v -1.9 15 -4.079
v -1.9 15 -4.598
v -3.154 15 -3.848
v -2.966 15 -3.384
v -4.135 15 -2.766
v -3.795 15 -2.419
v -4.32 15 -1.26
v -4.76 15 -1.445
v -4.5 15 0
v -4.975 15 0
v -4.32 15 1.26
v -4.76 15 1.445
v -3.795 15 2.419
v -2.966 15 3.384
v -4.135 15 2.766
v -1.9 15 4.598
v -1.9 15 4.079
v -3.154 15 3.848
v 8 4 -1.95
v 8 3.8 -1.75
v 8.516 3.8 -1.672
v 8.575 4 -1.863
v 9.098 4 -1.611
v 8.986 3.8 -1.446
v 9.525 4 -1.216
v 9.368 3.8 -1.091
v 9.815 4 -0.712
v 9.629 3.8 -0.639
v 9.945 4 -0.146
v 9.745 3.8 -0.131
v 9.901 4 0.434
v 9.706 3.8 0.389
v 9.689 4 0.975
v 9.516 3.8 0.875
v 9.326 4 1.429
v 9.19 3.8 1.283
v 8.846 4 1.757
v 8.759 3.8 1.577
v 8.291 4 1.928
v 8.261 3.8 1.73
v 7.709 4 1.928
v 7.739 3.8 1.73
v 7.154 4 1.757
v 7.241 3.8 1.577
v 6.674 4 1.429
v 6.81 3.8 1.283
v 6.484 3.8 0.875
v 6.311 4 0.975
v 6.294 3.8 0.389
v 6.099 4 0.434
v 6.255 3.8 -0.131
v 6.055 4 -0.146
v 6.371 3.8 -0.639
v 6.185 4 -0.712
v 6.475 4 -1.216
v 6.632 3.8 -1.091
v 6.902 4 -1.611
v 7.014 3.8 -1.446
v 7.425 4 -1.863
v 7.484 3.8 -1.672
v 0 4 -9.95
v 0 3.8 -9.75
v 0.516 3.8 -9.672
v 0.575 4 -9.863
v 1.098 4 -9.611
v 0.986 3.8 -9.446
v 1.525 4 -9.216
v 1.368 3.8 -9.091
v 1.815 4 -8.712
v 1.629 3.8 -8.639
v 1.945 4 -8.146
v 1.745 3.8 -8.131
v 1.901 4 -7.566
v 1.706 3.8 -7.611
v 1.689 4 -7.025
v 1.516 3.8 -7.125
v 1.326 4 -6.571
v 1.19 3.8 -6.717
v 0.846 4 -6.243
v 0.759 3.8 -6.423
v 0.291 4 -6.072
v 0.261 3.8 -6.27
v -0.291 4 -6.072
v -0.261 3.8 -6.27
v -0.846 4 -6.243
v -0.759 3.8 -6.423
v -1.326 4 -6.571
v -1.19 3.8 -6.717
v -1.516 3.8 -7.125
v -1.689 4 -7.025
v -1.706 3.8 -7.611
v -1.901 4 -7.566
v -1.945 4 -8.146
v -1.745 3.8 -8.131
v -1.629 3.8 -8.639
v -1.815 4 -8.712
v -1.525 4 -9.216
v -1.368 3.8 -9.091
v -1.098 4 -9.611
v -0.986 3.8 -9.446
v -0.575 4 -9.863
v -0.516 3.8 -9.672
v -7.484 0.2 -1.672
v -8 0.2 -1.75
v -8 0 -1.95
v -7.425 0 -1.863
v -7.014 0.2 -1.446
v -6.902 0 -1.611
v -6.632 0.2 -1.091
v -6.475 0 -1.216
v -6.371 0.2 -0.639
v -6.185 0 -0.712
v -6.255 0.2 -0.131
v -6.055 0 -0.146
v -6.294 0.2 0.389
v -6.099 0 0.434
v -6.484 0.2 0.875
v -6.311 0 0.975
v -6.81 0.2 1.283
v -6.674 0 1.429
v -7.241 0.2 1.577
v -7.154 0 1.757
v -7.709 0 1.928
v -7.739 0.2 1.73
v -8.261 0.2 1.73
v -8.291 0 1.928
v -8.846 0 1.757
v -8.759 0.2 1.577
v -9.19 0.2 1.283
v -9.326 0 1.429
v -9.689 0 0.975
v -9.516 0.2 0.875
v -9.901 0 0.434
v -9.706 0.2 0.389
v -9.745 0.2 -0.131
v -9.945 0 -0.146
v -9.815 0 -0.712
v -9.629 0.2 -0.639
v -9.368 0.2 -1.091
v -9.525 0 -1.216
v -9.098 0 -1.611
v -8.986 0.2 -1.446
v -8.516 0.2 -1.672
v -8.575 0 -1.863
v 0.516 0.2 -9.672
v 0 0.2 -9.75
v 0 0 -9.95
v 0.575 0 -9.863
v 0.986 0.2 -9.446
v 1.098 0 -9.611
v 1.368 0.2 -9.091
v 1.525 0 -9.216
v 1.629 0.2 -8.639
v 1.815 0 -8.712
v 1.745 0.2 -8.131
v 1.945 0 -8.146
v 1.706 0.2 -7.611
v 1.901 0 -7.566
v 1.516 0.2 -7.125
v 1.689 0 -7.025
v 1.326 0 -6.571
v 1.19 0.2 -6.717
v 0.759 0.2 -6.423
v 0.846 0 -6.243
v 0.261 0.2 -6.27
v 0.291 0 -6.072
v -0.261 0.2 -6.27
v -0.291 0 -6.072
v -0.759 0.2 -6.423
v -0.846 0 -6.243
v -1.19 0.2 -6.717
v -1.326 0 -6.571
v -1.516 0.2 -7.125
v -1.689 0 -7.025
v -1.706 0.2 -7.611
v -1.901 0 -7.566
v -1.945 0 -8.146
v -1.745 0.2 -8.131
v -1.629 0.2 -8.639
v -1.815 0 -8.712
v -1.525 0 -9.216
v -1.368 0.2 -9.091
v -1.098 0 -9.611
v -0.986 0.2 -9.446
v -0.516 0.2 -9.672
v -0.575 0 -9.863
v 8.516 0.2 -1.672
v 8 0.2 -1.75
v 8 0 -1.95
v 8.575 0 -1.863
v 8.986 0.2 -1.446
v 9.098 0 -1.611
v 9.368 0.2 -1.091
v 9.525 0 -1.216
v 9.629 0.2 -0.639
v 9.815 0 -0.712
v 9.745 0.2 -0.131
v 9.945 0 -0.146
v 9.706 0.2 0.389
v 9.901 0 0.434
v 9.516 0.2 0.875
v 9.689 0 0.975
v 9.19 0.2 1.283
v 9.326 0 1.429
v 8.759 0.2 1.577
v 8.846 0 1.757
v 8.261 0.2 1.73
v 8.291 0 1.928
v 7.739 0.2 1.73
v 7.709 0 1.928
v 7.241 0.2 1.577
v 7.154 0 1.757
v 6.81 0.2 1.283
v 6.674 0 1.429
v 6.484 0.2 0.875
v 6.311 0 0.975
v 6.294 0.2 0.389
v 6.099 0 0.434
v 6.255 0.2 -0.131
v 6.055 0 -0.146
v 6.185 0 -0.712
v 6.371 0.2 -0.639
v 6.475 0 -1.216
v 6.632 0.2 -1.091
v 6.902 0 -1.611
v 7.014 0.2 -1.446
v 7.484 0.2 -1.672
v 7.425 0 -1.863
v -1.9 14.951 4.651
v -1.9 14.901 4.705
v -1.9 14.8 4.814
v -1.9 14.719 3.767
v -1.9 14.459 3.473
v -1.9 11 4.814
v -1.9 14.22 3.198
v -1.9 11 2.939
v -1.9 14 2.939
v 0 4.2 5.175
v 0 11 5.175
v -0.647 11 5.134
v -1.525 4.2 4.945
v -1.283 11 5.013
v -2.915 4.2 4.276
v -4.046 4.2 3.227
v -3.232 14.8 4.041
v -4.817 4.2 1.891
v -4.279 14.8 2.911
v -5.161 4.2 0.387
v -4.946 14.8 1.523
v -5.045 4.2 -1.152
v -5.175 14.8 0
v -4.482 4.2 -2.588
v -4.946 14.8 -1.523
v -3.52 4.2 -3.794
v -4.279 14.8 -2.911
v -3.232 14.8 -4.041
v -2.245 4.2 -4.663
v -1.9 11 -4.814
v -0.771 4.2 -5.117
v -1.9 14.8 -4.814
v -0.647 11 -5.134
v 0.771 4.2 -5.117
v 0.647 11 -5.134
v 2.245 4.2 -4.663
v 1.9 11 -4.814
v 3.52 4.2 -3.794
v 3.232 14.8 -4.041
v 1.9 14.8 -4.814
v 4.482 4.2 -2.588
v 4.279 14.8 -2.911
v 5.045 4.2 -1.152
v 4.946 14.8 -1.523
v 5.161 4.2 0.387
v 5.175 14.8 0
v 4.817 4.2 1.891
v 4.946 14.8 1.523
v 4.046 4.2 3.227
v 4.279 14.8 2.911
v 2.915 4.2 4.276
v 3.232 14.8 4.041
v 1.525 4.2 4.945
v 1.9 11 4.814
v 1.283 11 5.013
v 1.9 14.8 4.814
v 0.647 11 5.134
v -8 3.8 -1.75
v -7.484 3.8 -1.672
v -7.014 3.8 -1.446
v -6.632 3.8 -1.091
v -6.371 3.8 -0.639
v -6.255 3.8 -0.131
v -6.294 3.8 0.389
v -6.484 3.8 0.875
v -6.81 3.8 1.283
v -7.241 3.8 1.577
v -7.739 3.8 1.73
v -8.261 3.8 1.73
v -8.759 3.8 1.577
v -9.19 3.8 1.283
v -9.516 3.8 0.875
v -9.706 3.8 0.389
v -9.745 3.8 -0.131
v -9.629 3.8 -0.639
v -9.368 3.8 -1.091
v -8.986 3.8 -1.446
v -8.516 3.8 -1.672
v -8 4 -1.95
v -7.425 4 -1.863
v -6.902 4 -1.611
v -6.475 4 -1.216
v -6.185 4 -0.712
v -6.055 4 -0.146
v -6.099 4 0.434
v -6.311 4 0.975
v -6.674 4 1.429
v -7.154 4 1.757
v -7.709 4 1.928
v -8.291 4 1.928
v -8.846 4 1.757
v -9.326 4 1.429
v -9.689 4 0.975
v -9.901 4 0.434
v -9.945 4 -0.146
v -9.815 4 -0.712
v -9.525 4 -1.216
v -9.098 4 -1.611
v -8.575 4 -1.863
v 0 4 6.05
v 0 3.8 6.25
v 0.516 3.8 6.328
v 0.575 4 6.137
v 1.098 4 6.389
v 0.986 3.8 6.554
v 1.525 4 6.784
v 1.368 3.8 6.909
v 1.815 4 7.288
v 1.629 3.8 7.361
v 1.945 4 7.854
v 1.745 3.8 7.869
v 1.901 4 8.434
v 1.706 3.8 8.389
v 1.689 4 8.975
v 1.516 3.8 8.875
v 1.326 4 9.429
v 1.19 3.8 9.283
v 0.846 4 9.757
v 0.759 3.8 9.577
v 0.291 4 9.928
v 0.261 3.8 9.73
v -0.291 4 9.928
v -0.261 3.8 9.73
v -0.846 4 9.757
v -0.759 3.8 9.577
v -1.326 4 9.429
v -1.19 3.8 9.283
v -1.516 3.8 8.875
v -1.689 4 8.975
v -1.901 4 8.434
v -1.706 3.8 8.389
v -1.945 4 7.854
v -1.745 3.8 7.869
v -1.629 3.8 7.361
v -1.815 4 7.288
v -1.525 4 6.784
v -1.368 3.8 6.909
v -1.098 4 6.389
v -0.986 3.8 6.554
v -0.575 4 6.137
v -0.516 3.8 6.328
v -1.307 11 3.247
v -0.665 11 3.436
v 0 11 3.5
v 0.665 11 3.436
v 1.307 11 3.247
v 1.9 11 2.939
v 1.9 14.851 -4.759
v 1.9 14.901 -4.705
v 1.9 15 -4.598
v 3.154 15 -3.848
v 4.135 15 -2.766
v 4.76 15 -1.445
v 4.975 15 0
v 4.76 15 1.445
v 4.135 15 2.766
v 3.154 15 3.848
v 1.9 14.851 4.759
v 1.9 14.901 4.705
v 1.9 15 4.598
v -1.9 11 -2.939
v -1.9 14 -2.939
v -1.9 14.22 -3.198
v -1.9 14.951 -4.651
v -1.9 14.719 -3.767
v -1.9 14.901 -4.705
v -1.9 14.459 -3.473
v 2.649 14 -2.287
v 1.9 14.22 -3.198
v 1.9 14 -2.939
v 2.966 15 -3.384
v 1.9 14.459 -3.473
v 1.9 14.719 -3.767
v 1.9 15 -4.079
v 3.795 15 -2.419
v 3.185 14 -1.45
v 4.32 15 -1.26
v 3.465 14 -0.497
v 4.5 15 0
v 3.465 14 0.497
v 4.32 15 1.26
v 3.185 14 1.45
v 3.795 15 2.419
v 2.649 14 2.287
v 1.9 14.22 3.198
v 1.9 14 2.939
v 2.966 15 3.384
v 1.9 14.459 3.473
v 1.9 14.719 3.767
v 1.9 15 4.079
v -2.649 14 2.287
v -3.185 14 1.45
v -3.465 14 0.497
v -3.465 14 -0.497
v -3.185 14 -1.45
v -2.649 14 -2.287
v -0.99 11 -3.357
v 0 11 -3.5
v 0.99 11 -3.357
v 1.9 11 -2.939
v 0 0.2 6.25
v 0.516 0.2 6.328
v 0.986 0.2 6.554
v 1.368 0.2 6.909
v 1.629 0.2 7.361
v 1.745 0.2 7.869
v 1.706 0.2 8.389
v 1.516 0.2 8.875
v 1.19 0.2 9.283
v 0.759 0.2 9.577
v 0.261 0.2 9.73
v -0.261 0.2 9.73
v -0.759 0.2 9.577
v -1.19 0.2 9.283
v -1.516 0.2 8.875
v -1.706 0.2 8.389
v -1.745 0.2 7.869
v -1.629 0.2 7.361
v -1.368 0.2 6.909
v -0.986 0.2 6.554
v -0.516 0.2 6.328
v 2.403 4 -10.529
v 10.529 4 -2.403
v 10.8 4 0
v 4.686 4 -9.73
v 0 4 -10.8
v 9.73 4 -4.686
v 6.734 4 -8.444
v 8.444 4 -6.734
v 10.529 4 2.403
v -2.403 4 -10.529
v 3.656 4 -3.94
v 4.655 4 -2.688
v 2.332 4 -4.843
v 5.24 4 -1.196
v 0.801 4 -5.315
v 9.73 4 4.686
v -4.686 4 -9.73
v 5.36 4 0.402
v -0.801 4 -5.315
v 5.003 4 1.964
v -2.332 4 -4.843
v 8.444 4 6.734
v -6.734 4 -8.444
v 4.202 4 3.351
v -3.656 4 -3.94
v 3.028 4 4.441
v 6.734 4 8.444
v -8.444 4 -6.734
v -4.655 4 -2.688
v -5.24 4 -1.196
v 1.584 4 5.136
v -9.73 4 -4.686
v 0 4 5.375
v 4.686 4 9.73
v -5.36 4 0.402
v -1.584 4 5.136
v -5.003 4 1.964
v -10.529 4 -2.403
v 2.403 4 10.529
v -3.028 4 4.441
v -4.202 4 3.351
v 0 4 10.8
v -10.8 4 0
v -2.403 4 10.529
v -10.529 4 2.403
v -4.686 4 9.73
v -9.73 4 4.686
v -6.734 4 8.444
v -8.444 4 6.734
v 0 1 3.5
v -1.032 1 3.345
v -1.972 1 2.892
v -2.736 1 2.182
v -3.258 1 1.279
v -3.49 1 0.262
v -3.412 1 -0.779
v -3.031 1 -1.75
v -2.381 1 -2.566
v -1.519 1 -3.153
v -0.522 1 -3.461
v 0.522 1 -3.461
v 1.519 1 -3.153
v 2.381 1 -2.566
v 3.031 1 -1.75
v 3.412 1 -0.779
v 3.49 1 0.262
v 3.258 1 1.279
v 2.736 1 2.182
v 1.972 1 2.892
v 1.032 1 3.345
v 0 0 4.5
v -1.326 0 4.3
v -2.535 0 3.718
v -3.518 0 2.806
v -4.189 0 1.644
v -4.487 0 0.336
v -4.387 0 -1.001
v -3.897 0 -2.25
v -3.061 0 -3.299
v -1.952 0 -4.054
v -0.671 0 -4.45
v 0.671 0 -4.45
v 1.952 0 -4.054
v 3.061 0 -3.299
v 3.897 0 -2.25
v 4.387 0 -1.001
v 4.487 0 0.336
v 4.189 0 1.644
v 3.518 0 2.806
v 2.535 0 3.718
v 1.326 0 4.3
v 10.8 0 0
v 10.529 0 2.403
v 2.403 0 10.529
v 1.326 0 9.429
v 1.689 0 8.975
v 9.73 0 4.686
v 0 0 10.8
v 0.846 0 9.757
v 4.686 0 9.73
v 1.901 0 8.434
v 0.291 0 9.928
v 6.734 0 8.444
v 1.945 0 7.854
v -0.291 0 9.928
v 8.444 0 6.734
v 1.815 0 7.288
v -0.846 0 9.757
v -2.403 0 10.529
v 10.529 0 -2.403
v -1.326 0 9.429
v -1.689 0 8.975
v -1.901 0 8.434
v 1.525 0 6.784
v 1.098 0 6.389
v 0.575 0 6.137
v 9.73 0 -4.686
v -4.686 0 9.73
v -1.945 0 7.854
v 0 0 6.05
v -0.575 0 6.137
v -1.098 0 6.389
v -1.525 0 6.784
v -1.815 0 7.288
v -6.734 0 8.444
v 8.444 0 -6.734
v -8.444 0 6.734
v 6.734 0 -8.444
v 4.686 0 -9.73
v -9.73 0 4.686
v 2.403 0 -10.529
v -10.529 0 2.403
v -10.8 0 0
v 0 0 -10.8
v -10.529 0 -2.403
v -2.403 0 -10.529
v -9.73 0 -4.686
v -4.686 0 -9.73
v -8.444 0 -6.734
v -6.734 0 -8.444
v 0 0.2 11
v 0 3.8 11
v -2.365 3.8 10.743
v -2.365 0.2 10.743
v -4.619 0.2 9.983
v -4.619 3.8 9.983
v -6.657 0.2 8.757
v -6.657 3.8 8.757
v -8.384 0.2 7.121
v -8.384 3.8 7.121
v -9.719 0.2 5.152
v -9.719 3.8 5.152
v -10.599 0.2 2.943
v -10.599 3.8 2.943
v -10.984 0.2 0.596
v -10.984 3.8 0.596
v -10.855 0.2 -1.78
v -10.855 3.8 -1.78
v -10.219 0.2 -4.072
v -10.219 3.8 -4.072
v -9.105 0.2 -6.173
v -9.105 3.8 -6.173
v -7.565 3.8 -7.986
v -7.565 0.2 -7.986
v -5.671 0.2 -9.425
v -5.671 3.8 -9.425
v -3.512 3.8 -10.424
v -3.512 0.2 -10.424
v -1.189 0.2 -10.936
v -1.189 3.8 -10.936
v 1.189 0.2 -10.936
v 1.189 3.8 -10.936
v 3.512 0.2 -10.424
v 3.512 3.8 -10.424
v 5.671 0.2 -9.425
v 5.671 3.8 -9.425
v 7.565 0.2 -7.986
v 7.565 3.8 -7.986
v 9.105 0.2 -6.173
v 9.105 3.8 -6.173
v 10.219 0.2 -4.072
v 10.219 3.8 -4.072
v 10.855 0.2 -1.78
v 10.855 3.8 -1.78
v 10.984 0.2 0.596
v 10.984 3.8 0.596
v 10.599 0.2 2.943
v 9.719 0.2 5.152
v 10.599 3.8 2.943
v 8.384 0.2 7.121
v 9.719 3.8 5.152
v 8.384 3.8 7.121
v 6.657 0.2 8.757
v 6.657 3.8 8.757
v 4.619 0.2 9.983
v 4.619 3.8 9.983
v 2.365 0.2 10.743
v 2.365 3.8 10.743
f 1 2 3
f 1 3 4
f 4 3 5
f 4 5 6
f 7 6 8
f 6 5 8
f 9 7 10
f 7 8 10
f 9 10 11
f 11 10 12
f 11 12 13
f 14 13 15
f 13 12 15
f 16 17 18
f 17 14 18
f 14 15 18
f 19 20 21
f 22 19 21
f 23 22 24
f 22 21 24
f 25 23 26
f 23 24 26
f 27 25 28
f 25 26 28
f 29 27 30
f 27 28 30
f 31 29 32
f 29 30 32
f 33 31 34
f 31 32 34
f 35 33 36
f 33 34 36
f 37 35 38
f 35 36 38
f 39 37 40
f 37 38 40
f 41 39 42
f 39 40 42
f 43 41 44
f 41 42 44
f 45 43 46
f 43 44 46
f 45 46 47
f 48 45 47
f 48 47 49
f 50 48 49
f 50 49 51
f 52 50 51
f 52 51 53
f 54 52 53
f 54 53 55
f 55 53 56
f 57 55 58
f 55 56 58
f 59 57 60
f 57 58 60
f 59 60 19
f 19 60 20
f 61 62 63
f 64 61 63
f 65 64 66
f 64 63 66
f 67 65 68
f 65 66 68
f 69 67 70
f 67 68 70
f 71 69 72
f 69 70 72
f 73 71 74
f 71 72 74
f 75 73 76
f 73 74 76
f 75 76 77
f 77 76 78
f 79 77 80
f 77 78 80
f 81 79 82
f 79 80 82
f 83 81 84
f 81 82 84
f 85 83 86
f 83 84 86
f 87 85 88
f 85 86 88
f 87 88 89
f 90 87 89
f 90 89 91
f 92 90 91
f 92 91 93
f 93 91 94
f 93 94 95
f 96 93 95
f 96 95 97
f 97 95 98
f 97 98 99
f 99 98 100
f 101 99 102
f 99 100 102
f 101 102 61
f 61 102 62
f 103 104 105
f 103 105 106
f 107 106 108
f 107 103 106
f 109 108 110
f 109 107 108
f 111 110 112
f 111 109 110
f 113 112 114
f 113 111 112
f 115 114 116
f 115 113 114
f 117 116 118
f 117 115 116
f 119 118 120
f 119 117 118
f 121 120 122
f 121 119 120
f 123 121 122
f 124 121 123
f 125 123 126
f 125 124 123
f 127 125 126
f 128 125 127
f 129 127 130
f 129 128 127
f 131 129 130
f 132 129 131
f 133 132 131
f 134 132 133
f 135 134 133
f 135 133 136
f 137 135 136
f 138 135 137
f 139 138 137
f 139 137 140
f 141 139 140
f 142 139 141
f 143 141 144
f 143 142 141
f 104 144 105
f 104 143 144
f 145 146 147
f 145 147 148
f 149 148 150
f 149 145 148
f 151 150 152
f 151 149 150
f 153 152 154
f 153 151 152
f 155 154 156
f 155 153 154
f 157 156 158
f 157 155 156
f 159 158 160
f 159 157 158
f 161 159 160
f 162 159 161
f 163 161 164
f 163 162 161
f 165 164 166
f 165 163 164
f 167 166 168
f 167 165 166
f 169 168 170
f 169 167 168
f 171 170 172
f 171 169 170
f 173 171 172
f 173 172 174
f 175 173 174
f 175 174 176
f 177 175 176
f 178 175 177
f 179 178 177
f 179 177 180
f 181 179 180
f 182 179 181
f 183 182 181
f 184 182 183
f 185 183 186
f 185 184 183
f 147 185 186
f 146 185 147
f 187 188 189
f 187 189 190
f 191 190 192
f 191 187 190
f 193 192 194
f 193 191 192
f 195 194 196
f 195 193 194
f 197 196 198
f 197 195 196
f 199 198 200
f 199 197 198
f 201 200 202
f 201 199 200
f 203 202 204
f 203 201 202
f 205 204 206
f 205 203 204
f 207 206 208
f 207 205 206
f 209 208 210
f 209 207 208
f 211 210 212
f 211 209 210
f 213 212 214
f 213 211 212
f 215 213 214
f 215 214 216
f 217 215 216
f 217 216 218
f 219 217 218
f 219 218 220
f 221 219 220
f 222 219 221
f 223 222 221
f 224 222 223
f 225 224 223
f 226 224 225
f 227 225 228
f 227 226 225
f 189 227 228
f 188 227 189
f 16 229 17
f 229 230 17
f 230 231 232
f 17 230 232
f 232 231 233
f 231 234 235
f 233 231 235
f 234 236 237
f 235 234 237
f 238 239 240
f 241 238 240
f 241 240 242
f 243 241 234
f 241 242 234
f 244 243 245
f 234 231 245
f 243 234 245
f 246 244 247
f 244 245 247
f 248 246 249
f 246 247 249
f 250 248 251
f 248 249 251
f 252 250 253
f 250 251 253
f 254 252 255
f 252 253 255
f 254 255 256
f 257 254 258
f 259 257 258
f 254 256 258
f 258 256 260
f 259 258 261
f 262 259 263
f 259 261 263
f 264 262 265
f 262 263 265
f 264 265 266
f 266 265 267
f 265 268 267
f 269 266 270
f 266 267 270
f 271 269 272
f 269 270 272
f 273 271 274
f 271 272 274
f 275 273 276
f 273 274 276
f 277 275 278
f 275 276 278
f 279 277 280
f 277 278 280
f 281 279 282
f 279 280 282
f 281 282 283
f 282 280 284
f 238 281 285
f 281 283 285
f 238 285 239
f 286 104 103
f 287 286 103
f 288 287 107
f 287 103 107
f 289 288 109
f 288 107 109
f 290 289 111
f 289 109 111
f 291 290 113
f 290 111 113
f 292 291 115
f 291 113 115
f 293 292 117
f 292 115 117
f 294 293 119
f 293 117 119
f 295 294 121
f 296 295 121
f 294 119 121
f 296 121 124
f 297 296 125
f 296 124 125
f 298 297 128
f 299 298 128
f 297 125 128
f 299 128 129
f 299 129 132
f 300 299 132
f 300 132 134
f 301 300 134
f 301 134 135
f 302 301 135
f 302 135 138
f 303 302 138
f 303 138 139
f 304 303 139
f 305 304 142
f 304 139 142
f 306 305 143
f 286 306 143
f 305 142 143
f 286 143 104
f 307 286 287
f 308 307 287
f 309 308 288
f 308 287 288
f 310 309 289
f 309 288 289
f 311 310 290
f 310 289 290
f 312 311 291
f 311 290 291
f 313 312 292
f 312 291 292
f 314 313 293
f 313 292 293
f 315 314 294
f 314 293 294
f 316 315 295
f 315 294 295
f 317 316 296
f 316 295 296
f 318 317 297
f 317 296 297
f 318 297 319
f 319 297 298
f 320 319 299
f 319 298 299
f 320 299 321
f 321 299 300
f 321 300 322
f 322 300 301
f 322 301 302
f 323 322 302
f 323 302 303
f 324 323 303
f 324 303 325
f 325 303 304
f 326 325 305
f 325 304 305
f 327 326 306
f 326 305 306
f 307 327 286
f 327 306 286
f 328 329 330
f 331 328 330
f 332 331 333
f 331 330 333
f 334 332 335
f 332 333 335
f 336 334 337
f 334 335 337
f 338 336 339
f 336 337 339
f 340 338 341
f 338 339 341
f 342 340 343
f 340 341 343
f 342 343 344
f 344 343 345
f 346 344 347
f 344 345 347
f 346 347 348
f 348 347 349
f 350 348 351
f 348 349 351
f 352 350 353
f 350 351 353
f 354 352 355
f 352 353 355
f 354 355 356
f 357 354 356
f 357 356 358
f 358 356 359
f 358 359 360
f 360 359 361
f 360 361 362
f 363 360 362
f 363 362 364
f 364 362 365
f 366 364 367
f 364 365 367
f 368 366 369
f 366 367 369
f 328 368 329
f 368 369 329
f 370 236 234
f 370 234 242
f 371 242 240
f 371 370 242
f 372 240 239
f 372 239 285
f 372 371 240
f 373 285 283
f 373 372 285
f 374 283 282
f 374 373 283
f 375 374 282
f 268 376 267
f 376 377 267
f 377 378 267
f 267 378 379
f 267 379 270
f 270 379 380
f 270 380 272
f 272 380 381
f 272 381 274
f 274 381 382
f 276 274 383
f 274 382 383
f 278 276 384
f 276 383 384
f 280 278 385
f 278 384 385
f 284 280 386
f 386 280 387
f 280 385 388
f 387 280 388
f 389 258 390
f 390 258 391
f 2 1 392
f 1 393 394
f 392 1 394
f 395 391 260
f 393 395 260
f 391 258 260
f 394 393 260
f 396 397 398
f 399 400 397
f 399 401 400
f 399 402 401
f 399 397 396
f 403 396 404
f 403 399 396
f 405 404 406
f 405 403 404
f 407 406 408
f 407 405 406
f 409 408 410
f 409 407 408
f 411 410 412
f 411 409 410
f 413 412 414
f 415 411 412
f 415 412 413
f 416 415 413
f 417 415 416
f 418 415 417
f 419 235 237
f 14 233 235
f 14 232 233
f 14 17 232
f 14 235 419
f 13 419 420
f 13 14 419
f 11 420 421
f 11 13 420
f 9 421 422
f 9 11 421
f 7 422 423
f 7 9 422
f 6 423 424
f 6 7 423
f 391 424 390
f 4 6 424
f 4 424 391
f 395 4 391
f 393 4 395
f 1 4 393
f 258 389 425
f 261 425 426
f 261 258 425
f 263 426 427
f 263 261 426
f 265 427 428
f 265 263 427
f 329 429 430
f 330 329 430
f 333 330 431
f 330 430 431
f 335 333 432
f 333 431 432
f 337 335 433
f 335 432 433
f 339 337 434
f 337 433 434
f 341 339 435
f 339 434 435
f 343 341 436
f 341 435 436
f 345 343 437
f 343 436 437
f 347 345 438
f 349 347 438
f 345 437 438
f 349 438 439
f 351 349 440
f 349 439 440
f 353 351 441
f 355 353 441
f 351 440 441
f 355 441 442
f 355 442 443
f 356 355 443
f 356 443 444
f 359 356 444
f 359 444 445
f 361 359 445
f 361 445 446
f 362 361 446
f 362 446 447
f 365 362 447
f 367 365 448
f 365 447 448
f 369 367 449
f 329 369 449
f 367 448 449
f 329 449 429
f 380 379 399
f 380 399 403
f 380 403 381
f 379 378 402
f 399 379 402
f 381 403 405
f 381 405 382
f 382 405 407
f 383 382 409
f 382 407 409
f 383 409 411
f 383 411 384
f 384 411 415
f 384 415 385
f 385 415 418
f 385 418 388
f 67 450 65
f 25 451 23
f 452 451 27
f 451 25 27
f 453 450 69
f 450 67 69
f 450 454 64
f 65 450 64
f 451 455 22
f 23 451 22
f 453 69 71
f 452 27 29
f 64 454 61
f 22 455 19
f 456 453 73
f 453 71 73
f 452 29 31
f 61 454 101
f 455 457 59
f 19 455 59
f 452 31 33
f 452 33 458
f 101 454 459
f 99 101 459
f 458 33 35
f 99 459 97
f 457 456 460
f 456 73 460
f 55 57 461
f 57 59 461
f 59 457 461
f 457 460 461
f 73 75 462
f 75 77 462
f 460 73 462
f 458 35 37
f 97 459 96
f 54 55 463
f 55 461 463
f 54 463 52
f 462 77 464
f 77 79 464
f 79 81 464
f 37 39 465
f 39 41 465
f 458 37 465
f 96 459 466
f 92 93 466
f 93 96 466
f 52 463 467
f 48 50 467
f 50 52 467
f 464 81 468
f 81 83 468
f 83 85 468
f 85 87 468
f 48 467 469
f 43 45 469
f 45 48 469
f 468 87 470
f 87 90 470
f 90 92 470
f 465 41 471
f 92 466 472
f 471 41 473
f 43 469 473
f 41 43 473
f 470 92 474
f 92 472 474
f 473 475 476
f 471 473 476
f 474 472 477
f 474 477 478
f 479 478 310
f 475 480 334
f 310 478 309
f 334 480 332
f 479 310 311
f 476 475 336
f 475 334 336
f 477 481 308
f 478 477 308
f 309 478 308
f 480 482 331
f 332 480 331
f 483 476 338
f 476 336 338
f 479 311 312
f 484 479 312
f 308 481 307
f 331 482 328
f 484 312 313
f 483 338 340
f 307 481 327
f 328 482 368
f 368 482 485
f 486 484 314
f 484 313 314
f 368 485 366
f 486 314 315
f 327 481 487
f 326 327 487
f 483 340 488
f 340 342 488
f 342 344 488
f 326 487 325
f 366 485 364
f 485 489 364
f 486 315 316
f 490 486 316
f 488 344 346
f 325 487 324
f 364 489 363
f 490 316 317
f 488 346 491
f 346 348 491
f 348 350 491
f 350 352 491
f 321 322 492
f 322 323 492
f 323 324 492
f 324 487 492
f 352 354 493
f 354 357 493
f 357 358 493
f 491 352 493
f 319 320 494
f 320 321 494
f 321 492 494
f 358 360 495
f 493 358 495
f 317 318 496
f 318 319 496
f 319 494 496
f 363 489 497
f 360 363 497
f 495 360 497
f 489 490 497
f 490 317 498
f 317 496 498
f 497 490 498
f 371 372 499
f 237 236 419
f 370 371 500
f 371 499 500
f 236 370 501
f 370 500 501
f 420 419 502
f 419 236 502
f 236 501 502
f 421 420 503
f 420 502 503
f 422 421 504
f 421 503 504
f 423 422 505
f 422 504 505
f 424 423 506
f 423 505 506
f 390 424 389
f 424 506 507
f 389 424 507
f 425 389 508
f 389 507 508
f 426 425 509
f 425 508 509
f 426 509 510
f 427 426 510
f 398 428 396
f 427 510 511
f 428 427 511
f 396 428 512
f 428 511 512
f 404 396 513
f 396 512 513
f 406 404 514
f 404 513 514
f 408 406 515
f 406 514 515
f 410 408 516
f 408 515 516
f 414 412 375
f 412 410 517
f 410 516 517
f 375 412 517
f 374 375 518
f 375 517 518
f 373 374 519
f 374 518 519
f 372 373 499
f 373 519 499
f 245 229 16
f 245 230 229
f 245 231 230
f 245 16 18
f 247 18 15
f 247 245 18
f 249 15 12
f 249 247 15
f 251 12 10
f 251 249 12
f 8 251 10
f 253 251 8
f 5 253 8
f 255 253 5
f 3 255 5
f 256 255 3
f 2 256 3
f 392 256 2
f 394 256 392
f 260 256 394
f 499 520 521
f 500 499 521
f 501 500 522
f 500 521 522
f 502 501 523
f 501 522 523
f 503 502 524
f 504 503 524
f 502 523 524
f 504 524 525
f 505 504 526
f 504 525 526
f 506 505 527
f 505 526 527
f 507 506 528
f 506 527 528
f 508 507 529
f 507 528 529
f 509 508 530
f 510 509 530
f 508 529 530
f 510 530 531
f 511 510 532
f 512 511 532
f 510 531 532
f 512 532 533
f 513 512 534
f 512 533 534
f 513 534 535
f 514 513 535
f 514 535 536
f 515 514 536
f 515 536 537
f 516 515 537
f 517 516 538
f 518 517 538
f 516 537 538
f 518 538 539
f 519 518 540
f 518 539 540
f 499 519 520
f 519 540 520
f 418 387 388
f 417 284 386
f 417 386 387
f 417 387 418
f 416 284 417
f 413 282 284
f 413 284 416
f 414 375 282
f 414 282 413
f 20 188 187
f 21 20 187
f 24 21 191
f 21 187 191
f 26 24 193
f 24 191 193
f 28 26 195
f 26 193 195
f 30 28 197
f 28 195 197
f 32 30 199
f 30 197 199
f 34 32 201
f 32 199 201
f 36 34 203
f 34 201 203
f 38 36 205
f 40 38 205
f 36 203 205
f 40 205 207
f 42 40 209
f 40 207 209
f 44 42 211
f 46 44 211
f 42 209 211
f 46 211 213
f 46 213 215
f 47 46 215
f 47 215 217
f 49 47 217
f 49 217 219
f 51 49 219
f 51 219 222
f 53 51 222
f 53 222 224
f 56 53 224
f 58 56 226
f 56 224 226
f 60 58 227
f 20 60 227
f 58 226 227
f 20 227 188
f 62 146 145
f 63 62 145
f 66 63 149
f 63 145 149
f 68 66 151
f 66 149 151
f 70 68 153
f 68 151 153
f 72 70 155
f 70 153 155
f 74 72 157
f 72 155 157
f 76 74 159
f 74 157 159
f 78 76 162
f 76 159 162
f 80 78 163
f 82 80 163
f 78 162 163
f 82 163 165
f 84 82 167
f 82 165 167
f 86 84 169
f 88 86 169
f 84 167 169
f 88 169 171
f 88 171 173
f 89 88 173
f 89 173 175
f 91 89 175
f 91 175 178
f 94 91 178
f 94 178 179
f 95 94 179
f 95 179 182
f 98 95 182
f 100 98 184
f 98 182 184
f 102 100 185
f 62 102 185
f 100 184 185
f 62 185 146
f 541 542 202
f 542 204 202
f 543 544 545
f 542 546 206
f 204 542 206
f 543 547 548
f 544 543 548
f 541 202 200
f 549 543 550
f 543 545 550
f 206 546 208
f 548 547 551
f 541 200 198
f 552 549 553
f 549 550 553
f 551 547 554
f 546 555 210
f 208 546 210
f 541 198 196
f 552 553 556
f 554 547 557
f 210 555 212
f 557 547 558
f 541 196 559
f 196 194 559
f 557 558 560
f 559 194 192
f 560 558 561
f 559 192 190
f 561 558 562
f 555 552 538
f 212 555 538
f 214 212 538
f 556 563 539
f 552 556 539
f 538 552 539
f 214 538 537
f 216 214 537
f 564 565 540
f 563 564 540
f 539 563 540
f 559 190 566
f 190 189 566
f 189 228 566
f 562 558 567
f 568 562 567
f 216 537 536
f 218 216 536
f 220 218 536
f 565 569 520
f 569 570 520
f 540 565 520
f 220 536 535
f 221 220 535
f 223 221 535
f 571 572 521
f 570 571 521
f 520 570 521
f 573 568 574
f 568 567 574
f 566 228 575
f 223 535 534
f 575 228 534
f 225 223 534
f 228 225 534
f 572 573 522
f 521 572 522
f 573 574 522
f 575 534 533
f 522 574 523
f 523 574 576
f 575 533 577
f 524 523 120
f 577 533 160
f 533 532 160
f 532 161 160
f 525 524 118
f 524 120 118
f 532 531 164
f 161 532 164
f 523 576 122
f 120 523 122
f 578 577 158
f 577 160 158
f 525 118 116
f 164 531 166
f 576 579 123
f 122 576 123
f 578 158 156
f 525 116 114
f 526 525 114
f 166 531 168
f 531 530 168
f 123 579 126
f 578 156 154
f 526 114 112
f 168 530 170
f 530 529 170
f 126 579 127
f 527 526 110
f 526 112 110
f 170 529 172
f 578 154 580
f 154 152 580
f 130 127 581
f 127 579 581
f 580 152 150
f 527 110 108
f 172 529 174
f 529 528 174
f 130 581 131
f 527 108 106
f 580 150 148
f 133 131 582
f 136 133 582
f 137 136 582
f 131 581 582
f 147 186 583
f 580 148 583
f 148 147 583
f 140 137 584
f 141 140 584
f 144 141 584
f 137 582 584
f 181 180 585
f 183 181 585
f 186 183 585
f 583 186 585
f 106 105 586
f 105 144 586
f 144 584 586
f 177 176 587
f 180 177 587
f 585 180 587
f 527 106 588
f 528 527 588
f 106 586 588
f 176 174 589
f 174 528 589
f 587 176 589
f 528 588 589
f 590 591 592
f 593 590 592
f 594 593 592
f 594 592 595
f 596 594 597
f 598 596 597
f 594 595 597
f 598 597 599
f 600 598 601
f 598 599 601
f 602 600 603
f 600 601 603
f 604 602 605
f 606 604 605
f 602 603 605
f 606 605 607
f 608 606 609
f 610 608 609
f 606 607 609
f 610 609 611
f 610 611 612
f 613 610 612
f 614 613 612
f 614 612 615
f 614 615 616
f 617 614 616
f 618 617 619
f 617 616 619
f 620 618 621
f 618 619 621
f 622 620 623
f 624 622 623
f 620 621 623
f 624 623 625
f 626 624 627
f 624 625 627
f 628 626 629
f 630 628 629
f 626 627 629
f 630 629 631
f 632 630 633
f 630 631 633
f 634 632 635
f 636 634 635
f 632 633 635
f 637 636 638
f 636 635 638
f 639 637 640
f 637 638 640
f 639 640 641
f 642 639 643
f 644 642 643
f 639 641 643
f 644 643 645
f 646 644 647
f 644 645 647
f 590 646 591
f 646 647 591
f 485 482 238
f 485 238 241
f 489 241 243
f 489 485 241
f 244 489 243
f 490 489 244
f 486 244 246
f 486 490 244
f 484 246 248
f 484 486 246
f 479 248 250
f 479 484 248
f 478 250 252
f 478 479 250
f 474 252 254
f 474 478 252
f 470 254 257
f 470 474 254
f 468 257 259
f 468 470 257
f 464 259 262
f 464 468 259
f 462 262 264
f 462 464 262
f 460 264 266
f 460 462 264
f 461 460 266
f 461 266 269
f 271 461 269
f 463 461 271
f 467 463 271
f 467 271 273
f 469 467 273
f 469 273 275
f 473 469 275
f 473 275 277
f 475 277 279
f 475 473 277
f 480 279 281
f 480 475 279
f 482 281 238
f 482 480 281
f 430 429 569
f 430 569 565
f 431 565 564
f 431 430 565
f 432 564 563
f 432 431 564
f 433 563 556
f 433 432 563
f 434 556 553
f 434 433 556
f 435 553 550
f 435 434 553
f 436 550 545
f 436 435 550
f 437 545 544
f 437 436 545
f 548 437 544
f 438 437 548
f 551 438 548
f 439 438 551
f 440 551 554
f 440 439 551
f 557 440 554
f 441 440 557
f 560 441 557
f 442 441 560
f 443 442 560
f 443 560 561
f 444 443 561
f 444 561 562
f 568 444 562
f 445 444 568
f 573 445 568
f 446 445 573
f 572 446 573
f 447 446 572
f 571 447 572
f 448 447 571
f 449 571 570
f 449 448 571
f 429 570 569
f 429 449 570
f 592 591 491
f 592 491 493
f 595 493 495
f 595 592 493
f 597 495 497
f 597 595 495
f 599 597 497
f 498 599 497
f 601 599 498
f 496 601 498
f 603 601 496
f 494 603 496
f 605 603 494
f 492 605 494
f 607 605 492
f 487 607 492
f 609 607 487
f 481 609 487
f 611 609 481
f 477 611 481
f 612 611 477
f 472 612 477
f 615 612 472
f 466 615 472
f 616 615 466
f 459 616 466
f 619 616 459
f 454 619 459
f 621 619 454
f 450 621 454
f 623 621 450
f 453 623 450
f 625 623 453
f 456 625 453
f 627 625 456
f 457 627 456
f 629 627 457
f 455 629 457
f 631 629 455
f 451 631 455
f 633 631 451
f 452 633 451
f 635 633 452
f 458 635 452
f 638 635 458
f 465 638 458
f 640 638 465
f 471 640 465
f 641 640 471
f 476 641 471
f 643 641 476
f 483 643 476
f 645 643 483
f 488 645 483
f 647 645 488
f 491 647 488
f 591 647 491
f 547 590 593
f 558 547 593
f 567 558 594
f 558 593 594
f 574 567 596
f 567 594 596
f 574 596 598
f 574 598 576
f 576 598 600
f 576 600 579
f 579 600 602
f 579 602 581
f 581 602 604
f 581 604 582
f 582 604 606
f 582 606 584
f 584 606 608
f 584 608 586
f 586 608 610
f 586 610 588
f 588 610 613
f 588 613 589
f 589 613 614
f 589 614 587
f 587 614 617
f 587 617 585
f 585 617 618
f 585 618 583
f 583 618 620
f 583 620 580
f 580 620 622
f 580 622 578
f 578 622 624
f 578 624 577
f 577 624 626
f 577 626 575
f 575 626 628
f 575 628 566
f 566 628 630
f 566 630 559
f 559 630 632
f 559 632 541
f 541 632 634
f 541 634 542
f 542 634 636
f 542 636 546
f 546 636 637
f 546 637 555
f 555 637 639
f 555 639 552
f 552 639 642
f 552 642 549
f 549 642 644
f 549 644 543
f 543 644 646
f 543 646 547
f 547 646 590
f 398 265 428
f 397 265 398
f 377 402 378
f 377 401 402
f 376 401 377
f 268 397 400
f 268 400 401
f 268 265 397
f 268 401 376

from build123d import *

# Parameters (mm, degrees)
CUT_EXTRUDE_1_DEPTH      = 22.610182785
CUT_EXTRUDE_1_DEPTH_BACK = 22.610182785
SKETCH_3_W               = 3.8
SKETCH_3_H               = 4
SKETCH_4_R               = 1.75
CUT_EXTRUDE_2_DEPTH      = 4
CHAMFER_1_SIZE           = 1
CHAMFER_2_SIZE           = 0.2


with BuildPart() as part:
    # Эскиз2 → Повернуть1 (revolve)
    with BuildSketch(Plane(origin=(0, 0, 0), x_dir=(0, 0, -1), z_dir=(1, 0, 0)), mode=Mode.PRIVATE) as revolve_1_sk:
        Polygon((3.5, 15), (3.5, 0), (11, 0), (11, 4), (5.175, 4), (5.175, 15), align=None)
    revolve(revolve_1_sk.sketch.rotate(Axis((0, 40.815789474, 0), (0, -1, 0)), 180), axis=Axis((0, 40.815789474, 0), (0, -1, 0)))

    # Эскиз3 → Вырез-Вытянуть1 (cut, two sides: drawn at the far end of the back side and taken through both)
    with BuildSketch(Plane.XY.offset(-CUT_EXTRUDE_1_DEPTH_BACK)):
        with Locations((0, 13)):
            Rectangle(SKETCH_3_W, SKETCH_3_H)
    extrude(amount=CUT_EXTRUDE_1_DEPTH + CUT_EXTRUDE_1_DEPTH_BACK, mode=Mode.SUBTRACT)

    # Эскиз4 → Вырез-Вытянуть2 (cut)
    with BuildSketch(Plane.XZ):
        with Locations(Location((0, 8, 0), (0, 0, 270))):
            Circle(SKETCH_4_R)
        with Locations(Location((8, 0, 0), (0, 0, 270))):
            Circle(SKETCH_4_R)
        with Locations(Location((0, -8, 0), (0, 0, 270))):
            Circle(SKETCH_4_R)
        with Locations(Location((-8, 0, 0), (0, 0, 270))):
            Circle(SKETCH_4_R)
    extrude(amount=-CUT_EXTRUDE_2_DEPTH, mode=Mode.SUBTRACT)

    # Фаска1
    chamfer_1_edges = [part.edges().sort_by_distance(p)[0] for p in [
        (-3.5, 15, 0),
        (0, 0, -3.5),
        (3.5, 15, 0),
    ]]
    chamfer(chamfer_1_edges, length=CHAMFER_1_SIZE)

    # Фаска2
    chamfer_2_edges = [part.edges().sort_by_distance(p)[0] for p in [
        (-5.175, 15, 0),
        (0, 4, 9.75),
        (0, 0, 9.75),
        (8, 4, 1.75),
        (8, 0, 1.75),
        (5.175, 15, 0),
        (0, 4, -6.25),
        (0, 0, -6.25),
        (0, 4, -5.175),
        (-8, 4, 1.75),
        (-8, 0, 1.75),
        (0, 4, -11),
        (0, 0, -11),
    ]]
    chamfer(chamfer_2_edges, length=CHAMFER_2_SIZE)


solid = part.part
